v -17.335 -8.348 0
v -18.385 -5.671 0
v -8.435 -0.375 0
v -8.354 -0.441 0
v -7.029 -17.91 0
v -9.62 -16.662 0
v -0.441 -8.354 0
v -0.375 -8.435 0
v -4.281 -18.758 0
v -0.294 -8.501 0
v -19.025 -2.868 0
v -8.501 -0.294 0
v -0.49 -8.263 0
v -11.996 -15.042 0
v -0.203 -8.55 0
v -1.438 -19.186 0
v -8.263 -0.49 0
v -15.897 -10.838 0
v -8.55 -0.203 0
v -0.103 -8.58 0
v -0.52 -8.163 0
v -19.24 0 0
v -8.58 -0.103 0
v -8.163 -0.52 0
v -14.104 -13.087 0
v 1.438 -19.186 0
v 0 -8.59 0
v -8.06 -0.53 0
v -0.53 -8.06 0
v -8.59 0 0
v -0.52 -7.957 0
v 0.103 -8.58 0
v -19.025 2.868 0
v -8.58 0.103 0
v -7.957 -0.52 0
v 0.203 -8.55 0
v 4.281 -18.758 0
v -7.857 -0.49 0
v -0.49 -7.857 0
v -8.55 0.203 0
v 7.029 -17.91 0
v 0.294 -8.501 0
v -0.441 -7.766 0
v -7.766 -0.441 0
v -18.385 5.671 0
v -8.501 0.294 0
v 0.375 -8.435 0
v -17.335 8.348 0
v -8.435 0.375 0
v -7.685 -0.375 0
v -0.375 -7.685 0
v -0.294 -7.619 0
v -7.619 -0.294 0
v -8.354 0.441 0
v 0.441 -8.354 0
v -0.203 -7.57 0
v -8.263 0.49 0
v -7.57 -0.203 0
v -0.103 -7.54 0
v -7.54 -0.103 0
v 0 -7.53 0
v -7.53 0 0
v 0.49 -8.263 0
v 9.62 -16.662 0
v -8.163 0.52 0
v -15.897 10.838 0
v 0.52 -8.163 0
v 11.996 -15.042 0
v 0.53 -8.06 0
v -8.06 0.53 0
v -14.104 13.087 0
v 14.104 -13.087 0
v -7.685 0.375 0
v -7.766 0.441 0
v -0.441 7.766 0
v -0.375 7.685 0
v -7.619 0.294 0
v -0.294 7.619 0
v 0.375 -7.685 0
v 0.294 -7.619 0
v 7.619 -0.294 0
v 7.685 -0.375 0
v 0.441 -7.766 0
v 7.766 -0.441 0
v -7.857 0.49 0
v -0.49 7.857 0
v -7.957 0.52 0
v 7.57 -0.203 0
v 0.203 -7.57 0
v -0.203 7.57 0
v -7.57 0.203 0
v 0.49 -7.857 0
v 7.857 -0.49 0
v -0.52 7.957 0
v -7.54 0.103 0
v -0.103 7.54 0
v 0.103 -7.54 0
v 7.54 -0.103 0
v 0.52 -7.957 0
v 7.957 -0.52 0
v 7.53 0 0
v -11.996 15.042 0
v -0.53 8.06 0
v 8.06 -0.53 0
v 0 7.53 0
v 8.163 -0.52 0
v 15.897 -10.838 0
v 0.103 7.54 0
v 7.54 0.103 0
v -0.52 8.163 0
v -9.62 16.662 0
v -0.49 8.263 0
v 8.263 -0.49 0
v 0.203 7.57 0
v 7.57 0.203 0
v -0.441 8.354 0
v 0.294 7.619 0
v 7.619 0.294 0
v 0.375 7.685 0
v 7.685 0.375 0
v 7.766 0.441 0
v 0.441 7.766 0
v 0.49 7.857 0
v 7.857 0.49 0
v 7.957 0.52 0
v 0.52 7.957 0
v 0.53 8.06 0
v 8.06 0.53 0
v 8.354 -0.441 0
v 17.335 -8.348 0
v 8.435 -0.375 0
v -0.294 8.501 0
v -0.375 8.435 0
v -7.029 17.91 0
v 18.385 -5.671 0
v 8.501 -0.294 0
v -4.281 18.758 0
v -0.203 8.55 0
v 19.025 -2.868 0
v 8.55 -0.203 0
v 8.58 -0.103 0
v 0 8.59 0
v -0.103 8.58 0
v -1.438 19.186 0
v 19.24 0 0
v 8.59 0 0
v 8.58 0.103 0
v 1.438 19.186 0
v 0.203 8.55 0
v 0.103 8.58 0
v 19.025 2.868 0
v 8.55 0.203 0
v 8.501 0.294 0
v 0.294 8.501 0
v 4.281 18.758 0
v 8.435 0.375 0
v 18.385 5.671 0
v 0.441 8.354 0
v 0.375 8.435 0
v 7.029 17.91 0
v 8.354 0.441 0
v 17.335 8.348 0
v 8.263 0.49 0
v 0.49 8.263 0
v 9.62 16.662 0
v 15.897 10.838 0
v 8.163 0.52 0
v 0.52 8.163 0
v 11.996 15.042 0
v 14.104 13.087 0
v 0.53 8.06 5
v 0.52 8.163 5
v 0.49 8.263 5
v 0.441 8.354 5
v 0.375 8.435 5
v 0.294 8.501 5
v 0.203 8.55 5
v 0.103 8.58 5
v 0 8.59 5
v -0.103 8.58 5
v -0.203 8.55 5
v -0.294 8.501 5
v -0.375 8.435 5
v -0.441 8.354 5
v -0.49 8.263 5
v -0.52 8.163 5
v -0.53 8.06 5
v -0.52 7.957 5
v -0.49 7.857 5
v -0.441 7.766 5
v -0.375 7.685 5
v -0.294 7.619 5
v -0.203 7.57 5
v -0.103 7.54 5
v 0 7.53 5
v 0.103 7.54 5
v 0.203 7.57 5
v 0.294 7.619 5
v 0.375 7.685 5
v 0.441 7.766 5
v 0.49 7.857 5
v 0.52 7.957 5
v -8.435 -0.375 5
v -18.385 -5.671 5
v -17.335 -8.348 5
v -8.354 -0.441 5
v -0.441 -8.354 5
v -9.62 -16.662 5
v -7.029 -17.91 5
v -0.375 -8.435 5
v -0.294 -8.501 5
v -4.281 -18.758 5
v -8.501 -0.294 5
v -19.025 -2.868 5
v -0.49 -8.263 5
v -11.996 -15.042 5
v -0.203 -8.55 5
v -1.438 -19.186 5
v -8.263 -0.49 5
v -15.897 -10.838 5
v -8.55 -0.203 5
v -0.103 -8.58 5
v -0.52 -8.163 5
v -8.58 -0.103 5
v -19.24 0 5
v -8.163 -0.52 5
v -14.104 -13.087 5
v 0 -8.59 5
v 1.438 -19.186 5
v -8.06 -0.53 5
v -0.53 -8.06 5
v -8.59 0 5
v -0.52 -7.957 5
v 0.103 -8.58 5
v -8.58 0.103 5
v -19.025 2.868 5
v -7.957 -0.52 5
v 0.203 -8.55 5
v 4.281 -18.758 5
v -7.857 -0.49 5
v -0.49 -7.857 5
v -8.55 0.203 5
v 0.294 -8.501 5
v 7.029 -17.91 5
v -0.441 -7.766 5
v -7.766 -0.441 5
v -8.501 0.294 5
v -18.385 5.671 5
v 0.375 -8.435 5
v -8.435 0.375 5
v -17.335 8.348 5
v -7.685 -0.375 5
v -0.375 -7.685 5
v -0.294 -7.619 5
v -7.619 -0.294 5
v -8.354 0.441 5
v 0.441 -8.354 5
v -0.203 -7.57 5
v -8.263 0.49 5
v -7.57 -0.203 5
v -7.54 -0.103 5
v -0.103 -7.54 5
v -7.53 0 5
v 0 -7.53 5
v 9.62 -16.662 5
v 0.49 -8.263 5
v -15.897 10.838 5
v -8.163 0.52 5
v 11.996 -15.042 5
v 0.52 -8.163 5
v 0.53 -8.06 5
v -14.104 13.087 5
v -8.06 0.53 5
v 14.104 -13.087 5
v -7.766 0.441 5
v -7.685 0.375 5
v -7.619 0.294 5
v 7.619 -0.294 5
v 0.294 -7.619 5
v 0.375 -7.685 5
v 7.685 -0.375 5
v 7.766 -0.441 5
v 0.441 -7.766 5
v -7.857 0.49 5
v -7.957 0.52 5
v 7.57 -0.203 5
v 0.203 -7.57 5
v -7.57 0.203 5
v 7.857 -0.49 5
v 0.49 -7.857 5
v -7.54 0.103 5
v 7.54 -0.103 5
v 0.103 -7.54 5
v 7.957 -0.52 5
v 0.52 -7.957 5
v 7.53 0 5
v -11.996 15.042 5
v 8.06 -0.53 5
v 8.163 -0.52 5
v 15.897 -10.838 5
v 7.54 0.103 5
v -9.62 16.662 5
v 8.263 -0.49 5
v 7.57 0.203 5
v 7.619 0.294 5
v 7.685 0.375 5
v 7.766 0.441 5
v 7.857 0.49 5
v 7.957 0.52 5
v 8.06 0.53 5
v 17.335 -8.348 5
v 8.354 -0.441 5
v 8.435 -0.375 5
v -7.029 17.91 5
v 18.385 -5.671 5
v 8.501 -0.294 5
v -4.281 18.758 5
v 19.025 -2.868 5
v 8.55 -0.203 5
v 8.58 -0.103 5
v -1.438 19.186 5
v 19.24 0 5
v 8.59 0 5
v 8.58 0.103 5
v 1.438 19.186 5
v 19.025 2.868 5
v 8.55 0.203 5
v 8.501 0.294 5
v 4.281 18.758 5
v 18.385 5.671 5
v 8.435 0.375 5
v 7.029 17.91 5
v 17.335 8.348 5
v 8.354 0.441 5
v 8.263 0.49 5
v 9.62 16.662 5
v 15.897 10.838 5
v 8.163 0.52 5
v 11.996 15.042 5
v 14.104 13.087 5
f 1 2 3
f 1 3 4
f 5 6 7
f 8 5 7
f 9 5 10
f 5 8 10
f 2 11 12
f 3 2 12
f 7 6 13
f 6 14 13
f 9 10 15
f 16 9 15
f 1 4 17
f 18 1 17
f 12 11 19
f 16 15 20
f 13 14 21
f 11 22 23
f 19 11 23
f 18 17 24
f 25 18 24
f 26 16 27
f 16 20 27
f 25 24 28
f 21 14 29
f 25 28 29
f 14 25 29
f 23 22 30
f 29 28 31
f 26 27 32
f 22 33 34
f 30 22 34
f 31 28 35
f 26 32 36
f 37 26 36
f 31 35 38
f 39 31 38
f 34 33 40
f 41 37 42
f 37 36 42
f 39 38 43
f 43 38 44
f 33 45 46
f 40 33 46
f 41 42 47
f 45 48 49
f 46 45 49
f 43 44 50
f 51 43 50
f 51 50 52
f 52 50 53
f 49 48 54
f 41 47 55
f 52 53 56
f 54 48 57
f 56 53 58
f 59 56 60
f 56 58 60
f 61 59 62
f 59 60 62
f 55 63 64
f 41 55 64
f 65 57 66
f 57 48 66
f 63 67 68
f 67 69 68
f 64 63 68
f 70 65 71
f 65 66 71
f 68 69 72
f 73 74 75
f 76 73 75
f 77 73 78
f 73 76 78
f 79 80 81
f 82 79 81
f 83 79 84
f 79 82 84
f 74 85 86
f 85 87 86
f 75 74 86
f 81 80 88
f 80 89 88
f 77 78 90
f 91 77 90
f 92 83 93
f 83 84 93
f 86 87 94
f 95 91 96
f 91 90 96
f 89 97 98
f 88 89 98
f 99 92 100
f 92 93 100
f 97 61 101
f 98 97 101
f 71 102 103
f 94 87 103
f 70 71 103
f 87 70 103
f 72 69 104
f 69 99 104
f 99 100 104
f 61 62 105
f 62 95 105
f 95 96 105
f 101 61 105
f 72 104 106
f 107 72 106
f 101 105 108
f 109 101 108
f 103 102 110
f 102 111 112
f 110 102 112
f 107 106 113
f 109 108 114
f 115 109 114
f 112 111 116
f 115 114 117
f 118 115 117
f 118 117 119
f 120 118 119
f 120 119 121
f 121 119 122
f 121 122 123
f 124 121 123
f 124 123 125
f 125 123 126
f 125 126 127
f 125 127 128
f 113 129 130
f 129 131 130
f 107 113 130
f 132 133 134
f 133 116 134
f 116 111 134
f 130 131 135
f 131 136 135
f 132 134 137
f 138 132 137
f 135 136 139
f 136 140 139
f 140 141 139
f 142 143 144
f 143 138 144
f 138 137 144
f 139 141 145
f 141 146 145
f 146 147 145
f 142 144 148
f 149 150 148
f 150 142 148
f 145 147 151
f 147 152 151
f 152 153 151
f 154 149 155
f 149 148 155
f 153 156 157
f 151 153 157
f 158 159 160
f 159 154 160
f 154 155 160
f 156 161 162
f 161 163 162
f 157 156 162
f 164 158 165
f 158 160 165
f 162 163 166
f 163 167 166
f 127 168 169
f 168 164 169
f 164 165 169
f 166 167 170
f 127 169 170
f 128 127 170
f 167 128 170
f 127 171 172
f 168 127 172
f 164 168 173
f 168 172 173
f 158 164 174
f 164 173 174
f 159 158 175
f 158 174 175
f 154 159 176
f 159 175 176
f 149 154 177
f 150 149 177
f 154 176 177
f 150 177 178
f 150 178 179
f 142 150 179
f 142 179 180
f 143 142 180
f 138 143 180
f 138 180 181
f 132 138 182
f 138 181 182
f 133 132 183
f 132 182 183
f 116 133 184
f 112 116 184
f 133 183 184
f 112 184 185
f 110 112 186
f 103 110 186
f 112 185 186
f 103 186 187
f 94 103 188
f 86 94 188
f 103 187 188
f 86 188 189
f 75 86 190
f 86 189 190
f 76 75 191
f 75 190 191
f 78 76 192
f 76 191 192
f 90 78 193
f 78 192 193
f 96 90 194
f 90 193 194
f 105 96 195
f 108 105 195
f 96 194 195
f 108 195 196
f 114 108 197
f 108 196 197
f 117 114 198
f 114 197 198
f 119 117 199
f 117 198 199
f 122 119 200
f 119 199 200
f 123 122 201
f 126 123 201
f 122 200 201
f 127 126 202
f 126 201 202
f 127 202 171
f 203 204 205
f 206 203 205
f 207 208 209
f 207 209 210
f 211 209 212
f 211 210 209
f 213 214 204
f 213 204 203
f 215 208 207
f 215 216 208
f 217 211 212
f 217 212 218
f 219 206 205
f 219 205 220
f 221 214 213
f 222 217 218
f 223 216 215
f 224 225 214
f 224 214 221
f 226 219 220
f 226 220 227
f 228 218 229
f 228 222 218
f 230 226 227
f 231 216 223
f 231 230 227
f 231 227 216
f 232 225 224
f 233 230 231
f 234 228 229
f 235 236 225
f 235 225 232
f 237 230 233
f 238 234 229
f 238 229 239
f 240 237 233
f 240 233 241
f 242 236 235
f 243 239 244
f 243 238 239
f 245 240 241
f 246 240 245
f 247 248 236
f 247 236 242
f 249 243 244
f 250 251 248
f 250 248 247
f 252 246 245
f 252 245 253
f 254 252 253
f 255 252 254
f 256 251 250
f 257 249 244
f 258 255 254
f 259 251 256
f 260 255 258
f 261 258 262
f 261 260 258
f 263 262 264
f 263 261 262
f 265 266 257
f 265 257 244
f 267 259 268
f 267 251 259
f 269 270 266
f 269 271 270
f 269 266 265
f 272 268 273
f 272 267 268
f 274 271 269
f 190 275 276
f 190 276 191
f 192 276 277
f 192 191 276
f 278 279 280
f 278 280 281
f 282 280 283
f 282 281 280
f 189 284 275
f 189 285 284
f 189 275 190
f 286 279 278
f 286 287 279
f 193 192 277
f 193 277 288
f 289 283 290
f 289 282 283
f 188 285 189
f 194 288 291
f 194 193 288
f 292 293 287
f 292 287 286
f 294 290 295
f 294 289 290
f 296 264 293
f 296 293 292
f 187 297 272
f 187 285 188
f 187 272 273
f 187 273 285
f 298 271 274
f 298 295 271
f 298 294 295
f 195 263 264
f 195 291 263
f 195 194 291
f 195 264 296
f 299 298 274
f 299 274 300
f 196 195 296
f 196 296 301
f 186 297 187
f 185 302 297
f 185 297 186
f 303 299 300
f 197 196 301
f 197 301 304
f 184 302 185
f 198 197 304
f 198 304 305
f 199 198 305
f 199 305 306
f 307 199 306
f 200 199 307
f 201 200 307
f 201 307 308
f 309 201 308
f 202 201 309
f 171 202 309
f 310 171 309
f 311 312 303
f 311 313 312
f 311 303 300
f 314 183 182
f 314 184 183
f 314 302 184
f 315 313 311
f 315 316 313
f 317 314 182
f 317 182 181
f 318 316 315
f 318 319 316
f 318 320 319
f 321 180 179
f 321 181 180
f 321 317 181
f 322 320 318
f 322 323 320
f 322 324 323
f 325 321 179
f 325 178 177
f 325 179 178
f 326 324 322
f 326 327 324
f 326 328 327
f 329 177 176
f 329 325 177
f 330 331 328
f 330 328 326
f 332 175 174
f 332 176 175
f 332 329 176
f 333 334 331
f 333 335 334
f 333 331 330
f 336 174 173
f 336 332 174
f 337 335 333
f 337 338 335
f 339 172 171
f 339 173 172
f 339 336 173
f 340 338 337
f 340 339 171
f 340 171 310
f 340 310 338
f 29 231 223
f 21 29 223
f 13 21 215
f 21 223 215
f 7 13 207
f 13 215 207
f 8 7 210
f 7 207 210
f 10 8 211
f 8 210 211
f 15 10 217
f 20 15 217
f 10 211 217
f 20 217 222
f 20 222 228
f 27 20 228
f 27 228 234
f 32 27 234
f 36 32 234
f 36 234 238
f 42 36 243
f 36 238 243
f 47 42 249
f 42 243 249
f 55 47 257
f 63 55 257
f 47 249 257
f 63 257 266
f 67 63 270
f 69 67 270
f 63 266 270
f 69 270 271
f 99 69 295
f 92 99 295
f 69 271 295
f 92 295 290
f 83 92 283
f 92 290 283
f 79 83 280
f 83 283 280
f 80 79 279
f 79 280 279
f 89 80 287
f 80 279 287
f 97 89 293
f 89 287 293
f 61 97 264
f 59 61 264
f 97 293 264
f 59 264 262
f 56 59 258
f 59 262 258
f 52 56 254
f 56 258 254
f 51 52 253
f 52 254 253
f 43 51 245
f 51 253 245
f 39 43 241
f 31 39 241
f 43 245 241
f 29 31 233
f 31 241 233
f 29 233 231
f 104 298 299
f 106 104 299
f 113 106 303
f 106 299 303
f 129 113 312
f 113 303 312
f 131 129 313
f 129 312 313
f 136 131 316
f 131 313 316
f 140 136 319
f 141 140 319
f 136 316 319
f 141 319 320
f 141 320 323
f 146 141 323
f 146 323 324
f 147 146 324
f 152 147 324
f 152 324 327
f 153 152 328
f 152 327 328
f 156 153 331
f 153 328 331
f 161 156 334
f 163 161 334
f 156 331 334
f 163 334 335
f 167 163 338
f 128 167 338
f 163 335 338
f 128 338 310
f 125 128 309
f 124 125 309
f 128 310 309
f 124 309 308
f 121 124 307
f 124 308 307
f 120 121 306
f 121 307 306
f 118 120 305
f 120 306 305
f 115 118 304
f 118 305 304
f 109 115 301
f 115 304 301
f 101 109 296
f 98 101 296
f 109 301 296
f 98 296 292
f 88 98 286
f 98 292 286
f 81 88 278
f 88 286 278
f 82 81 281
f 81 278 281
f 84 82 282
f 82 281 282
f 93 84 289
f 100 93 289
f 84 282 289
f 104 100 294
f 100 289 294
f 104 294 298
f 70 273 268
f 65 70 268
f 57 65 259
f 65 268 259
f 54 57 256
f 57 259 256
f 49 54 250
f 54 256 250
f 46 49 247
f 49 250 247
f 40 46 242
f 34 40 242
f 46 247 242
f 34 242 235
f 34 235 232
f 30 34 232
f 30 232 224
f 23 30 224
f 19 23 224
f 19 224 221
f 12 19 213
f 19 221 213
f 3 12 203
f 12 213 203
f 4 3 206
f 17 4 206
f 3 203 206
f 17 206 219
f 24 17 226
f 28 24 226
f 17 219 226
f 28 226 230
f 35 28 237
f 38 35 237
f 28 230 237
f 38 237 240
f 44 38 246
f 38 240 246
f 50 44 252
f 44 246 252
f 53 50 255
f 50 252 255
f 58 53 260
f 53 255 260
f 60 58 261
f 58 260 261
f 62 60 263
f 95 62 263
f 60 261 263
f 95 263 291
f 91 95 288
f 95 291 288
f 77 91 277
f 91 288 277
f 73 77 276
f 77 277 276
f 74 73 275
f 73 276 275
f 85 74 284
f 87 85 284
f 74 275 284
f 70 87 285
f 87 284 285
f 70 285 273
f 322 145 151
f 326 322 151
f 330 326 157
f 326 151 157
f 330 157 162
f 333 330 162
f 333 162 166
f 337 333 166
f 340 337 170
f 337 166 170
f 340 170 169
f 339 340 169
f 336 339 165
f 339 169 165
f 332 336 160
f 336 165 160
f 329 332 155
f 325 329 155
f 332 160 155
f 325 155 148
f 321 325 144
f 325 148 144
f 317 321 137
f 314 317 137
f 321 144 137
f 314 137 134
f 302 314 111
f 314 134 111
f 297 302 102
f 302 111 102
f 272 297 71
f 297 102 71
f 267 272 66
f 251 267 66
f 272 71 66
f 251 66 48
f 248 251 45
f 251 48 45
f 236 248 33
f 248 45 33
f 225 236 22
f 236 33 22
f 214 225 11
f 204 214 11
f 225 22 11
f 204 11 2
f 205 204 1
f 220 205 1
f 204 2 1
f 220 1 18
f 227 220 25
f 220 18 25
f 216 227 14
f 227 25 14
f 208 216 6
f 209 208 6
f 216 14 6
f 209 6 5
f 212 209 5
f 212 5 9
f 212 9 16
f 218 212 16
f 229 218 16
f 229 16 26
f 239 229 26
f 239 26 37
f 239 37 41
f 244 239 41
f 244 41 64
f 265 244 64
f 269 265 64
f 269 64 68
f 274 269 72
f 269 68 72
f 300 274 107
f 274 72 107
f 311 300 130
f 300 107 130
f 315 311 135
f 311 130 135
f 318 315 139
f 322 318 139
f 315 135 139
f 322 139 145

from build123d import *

# Parameters (mm, degrees)
ESQUISSE1_R                  = 19.24
BOSS_EXTRU_1_DEPTH           = 5
ESQUISSE2_R                  = 0.53
ENL_V_MAT_EXTRU_1_DEPTH      = 5
R_P_TITION_CIRCULAIRE1_COUNT = 4


with BuildPart() as part:
    # Esquisse1 → Boss.-Extru.1 (new body)
    with BuildSketch(Plane.XY):
        Circle(ESQUISSE1_R)
    extrude(amount=BOSS_EXTRU_1_DEPTH)

    # Esquisse2 → Enlèv. mat.-Extru.1 (cut)
    with BuildSketch(Plane.XY.offset(5)):
        with Locations((0, 8.06)):
            Circle(ESQUISSE2_R)
    enl_v_mat_extru_1 = extrude(amount=-ENL_V_MAT_EXTRU_1_DEPTH, mode=Mode.SUBTRACT)

    # Répétition circulaire1: Enlèv. mat.-Extru.1 ×4 about axis
    r_p_tition_circulaire1_axis = Axis((0, 0, 0), (0, 0, 1))
    for i in range(1, R_P_TITION_CIRCULAIRE1_COUNT):
        add(enl_v_mat_extru_1.rotate(r_p_tition_circulaire1_axis, i * 360 / R_P_TITION_CIRCULAIRE1_COUNT), mode=Mode.SUBTRACT)


solid = part.part
